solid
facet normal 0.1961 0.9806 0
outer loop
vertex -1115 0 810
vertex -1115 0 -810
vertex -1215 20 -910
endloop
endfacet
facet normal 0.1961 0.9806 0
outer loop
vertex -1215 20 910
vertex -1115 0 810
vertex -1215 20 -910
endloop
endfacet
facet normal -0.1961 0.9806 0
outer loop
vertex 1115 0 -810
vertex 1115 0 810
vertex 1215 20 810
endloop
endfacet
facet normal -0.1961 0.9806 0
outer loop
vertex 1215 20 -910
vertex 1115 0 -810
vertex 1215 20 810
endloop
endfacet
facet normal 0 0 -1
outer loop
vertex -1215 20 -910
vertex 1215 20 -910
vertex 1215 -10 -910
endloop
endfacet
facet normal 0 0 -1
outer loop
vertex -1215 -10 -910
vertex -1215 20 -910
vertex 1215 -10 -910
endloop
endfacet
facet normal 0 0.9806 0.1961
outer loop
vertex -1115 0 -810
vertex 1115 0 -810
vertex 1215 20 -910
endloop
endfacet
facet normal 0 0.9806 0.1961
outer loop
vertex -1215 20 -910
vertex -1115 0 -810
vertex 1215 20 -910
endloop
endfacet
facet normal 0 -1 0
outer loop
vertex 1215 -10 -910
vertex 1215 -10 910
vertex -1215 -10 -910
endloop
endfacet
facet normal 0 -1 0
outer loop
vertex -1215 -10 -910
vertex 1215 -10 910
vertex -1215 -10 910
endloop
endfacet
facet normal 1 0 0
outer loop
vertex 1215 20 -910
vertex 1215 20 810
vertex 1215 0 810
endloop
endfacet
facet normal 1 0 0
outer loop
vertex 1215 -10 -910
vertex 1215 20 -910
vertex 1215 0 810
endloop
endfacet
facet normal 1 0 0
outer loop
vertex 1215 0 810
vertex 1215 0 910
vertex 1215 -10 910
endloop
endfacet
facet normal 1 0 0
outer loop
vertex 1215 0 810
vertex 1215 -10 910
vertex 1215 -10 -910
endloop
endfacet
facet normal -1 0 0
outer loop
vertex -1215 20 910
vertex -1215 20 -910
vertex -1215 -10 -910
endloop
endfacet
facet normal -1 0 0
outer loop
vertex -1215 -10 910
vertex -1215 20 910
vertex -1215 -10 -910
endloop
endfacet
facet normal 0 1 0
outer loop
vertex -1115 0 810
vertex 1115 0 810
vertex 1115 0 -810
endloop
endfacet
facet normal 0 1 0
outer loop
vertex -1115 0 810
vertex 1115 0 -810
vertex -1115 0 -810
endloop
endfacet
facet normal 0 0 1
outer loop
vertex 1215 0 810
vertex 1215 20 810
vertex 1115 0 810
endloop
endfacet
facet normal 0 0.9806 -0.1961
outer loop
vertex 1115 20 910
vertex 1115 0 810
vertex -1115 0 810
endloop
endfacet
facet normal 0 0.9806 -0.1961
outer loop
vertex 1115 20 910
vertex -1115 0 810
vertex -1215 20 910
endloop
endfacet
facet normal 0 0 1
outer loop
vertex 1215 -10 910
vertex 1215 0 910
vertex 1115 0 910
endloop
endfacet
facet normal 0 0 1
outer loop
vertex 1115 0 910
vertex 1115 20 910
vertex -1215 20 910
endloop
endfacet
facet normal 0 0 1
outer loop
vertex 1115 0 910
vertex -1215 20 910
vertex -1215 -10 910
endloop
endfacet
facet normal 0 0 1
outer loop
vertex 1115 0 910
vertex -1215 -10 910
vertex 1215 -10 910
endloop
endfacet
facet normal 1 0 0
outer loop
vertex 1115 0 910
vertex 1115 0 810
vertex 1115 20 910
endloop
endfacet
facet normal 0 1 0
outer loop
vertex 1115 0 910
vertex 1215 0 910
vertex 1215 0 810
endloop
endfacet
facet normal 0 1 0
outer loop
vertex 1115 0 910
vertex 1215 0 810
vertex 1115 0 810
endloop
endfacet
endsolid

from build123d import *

# Parameters (mm, degrees)
SKETCH_1_W      = 2430
SKETCH_1_H      = 1820
EXTRUDE_2_DEPTH = 10


with BuildPart() as part:
    # Эскиз1 → Выдавливание2 (new body)
    with BuildSketch(Plane(origin=(0, 0, 0), x_dir=(-1, 0, 0), z_dir=(0, 1, 0))):
        Rectangle(SKETCH_1_W, SKETCH_1_H)
    extrude(amount=-EXTRUDE_2_DEPTH)

    # Sweep 1: sweep along a curve in space
    with BuildLine() as sweep_1_path:
        Line((-1115, 0, 810), (-1115, 0, 0))
        Line((1115, 0, 810), (-1115, 0, 810))
    # Эскиз2 → Sweep 1 (sweep)
    with BuildSketch(Plane.XY):
        Polygon((-1115, 0), (-1215, 20), (-1215, 0), align=None)
    sweep(path=sweep_1_path.line, transition=Transition.RIGHT)

    # Sweep 1 2: sweep along a curve in space
    with BuildLine() as sweep_1_2_path:
        Line((1115, 0, -810), (1115, 0, 810))
        Line((-1115, 0, -810), (1115, 0, -810))
        Line((-1115, 0, 0), (-1115, 0, -810))
    # Эскиз2<2> → Sweep 1 2 (sweep)
    with BuildSketch(Plane.XY):
        Polygon((-1115, 0), (-1215, 20), (-1215, 0), align=None)
    sweep(path=sweep_1_2_path.line, transition=Transition.RIGHT)


solid = part.part
